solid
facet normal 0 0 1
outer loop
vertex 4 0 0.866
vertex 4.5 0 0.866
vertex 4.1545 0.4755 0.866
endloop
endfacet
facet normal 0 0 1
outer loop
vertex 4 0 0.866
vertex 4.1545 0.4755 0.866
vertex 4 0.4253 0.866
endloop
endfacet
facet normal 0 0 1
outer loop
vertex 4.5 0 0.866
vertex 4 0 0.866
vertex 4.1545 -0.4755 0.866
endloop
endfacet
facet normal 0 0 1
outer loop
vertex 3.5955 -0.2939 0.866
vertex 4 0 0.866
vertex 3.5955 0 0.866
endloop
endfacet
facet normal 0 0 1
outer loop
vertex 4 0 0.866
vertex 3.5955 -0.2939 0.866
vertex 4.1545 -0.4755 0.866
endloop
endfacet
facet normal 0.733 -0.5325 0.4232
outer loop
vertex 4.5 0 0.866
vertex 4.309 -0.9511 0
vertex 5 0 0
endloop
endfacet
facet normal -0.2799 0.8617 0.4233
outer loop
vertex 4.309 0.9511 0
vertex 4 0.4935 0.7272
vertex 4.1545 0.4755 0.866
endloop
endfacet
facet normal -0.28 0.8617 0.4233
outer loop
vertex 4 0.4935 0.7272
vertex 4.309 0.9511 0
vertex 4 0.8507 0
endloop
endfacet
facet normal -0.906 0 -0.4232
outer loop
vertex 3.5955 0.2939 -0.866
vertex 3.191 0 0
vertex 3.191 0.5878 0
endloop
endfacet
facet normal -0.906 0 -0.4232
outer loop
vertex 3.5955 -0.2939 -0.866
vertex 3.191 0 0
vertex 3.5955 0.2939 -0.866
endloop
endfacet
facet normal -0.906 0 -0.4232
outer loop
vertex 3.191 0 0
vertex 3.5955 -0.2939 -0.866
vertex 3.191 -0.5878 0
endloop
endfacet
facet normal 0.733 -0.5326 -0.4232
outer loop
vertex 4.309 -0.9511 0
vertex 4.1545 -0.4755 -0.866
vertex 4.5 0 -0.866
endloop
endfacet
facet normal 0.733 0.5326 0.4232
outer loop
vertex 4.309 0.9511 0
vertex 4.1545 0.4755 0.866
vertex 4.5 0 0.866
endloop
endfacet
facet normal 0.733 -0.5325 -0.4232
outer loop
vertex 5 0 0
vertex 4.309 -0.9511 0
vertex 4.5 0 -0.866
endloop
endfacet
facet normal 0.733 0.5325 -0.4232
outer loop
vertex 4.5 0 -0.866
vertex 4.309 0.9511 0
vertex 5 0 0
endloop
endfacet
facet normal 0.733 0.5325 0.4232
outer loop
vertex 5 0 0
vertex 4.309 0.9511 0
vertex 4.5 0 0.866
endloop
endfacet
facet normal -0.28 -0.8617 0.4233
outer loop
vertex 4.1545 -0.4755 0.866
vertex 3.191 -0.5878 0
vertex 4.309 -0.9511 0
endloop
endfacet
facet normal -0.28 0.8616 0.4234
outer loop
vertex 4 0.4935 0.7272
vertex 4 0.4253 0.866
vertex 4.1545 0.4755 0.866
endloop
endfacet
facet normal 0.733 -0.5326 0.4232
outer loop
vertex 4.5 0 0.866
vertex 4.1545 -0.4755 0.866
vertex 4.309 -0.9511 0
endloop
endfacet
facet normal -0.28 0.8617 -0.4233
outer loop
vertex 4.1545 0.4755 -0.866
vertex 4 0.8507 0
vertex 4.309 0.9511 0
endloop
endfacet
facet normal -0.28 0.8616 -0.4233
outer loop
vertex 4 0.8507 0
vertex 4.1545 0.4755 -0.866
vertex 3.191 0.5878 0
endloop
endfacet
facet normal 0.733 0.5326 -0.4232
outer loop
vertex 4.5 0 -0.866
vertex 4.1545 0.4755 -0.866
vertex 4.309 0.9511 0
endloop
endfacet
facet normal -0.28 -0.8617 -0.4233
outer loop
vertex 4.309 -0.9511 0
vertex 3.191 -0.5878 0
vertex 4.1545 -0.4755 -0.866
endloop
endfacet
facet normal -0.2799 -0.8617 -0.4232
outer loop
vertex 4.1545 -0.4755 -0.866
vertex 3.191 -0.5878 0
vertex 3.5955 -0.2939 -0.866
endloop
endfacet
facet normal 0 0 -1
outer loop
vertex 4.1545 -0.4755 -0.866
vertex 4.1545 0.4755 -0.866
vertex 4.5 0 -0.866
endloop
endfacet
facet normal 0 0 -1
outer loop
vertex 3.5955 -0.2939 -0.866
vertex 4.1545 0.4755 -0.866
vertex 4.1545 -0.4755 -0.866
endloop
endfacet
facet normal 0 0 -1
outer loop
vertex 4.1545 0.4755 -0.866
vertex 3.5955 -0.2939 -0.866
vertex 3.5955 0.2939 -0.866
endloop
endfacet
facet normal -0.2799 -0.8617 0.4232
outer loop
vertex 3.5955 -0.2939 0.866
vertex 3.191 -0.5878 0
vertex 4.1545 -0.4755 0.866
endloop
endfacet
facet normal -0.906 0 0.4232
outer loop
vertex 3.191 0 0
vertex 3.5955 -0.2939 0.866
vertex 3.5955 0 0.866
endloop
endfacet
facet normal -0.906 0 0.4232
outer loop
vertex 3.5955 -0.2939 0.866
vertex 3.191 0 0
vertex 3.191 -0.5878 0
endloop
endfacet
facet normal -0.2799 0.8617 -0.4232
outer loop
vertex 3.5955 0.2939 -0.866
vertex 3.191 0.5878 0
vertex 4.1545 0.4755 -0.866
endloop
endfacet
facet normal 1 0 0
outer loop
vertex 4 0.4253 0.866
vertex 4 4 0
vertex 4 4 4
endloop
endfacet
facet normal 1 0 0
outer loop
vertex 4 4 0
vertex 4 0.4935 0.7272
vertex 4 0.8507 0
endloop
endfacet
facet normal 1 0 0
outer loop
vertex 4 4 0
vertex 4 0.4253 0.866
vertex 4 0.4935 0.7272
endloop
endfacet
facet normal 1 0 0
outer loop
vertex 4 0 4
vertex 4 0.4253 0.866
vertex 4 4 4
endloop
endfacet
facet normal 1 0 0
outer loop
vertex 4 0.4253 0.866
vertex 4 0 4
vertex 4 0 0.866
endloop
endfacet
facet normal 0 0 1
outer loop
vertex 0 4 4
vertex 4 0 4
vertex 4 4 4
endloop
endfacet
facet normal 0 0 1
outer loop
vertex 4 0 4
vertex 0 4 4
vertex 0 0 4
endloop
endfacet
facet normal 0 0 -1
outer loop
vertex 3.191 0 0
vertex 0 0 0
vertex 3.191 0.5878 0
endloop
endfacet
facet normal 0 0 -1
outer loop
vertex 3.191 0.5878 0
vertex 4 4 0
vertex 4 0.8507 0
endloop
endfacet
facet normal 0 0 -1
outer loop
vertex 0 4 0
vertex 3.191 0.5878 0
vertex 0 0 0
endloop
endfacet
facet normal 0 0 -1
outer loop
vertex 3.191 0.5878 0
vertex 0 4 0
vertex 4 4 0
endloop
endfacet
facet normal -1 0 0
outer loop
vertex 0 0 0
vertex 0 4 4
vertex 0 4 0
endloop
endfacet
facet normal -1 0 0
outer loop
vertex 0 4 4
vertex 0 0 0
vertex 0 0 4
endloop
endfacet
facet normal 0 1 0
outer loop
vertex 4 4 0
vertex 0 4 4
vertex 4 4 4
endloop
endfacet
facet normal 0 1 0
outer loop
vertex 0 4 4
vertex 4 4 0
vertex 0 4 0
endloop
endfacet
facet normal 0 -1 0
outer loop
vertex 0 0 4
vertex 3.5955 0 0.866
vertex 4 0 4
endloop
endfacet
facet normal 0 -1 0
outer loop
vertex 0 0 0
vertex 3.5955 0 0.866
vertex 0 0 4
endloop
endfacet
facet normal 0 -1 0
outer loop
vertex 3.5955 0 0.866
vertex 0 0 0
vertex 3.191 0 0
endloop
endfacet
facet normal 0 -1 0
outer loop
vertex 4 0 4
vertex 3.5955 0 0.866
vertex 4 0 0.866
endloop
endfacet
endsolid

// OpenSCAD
/* [Hidden] */

// onescad: main.scad

module m() {
  k = 4;
translate([k, 0, 0]) sphere(1);

  cube(k);
}

m();
